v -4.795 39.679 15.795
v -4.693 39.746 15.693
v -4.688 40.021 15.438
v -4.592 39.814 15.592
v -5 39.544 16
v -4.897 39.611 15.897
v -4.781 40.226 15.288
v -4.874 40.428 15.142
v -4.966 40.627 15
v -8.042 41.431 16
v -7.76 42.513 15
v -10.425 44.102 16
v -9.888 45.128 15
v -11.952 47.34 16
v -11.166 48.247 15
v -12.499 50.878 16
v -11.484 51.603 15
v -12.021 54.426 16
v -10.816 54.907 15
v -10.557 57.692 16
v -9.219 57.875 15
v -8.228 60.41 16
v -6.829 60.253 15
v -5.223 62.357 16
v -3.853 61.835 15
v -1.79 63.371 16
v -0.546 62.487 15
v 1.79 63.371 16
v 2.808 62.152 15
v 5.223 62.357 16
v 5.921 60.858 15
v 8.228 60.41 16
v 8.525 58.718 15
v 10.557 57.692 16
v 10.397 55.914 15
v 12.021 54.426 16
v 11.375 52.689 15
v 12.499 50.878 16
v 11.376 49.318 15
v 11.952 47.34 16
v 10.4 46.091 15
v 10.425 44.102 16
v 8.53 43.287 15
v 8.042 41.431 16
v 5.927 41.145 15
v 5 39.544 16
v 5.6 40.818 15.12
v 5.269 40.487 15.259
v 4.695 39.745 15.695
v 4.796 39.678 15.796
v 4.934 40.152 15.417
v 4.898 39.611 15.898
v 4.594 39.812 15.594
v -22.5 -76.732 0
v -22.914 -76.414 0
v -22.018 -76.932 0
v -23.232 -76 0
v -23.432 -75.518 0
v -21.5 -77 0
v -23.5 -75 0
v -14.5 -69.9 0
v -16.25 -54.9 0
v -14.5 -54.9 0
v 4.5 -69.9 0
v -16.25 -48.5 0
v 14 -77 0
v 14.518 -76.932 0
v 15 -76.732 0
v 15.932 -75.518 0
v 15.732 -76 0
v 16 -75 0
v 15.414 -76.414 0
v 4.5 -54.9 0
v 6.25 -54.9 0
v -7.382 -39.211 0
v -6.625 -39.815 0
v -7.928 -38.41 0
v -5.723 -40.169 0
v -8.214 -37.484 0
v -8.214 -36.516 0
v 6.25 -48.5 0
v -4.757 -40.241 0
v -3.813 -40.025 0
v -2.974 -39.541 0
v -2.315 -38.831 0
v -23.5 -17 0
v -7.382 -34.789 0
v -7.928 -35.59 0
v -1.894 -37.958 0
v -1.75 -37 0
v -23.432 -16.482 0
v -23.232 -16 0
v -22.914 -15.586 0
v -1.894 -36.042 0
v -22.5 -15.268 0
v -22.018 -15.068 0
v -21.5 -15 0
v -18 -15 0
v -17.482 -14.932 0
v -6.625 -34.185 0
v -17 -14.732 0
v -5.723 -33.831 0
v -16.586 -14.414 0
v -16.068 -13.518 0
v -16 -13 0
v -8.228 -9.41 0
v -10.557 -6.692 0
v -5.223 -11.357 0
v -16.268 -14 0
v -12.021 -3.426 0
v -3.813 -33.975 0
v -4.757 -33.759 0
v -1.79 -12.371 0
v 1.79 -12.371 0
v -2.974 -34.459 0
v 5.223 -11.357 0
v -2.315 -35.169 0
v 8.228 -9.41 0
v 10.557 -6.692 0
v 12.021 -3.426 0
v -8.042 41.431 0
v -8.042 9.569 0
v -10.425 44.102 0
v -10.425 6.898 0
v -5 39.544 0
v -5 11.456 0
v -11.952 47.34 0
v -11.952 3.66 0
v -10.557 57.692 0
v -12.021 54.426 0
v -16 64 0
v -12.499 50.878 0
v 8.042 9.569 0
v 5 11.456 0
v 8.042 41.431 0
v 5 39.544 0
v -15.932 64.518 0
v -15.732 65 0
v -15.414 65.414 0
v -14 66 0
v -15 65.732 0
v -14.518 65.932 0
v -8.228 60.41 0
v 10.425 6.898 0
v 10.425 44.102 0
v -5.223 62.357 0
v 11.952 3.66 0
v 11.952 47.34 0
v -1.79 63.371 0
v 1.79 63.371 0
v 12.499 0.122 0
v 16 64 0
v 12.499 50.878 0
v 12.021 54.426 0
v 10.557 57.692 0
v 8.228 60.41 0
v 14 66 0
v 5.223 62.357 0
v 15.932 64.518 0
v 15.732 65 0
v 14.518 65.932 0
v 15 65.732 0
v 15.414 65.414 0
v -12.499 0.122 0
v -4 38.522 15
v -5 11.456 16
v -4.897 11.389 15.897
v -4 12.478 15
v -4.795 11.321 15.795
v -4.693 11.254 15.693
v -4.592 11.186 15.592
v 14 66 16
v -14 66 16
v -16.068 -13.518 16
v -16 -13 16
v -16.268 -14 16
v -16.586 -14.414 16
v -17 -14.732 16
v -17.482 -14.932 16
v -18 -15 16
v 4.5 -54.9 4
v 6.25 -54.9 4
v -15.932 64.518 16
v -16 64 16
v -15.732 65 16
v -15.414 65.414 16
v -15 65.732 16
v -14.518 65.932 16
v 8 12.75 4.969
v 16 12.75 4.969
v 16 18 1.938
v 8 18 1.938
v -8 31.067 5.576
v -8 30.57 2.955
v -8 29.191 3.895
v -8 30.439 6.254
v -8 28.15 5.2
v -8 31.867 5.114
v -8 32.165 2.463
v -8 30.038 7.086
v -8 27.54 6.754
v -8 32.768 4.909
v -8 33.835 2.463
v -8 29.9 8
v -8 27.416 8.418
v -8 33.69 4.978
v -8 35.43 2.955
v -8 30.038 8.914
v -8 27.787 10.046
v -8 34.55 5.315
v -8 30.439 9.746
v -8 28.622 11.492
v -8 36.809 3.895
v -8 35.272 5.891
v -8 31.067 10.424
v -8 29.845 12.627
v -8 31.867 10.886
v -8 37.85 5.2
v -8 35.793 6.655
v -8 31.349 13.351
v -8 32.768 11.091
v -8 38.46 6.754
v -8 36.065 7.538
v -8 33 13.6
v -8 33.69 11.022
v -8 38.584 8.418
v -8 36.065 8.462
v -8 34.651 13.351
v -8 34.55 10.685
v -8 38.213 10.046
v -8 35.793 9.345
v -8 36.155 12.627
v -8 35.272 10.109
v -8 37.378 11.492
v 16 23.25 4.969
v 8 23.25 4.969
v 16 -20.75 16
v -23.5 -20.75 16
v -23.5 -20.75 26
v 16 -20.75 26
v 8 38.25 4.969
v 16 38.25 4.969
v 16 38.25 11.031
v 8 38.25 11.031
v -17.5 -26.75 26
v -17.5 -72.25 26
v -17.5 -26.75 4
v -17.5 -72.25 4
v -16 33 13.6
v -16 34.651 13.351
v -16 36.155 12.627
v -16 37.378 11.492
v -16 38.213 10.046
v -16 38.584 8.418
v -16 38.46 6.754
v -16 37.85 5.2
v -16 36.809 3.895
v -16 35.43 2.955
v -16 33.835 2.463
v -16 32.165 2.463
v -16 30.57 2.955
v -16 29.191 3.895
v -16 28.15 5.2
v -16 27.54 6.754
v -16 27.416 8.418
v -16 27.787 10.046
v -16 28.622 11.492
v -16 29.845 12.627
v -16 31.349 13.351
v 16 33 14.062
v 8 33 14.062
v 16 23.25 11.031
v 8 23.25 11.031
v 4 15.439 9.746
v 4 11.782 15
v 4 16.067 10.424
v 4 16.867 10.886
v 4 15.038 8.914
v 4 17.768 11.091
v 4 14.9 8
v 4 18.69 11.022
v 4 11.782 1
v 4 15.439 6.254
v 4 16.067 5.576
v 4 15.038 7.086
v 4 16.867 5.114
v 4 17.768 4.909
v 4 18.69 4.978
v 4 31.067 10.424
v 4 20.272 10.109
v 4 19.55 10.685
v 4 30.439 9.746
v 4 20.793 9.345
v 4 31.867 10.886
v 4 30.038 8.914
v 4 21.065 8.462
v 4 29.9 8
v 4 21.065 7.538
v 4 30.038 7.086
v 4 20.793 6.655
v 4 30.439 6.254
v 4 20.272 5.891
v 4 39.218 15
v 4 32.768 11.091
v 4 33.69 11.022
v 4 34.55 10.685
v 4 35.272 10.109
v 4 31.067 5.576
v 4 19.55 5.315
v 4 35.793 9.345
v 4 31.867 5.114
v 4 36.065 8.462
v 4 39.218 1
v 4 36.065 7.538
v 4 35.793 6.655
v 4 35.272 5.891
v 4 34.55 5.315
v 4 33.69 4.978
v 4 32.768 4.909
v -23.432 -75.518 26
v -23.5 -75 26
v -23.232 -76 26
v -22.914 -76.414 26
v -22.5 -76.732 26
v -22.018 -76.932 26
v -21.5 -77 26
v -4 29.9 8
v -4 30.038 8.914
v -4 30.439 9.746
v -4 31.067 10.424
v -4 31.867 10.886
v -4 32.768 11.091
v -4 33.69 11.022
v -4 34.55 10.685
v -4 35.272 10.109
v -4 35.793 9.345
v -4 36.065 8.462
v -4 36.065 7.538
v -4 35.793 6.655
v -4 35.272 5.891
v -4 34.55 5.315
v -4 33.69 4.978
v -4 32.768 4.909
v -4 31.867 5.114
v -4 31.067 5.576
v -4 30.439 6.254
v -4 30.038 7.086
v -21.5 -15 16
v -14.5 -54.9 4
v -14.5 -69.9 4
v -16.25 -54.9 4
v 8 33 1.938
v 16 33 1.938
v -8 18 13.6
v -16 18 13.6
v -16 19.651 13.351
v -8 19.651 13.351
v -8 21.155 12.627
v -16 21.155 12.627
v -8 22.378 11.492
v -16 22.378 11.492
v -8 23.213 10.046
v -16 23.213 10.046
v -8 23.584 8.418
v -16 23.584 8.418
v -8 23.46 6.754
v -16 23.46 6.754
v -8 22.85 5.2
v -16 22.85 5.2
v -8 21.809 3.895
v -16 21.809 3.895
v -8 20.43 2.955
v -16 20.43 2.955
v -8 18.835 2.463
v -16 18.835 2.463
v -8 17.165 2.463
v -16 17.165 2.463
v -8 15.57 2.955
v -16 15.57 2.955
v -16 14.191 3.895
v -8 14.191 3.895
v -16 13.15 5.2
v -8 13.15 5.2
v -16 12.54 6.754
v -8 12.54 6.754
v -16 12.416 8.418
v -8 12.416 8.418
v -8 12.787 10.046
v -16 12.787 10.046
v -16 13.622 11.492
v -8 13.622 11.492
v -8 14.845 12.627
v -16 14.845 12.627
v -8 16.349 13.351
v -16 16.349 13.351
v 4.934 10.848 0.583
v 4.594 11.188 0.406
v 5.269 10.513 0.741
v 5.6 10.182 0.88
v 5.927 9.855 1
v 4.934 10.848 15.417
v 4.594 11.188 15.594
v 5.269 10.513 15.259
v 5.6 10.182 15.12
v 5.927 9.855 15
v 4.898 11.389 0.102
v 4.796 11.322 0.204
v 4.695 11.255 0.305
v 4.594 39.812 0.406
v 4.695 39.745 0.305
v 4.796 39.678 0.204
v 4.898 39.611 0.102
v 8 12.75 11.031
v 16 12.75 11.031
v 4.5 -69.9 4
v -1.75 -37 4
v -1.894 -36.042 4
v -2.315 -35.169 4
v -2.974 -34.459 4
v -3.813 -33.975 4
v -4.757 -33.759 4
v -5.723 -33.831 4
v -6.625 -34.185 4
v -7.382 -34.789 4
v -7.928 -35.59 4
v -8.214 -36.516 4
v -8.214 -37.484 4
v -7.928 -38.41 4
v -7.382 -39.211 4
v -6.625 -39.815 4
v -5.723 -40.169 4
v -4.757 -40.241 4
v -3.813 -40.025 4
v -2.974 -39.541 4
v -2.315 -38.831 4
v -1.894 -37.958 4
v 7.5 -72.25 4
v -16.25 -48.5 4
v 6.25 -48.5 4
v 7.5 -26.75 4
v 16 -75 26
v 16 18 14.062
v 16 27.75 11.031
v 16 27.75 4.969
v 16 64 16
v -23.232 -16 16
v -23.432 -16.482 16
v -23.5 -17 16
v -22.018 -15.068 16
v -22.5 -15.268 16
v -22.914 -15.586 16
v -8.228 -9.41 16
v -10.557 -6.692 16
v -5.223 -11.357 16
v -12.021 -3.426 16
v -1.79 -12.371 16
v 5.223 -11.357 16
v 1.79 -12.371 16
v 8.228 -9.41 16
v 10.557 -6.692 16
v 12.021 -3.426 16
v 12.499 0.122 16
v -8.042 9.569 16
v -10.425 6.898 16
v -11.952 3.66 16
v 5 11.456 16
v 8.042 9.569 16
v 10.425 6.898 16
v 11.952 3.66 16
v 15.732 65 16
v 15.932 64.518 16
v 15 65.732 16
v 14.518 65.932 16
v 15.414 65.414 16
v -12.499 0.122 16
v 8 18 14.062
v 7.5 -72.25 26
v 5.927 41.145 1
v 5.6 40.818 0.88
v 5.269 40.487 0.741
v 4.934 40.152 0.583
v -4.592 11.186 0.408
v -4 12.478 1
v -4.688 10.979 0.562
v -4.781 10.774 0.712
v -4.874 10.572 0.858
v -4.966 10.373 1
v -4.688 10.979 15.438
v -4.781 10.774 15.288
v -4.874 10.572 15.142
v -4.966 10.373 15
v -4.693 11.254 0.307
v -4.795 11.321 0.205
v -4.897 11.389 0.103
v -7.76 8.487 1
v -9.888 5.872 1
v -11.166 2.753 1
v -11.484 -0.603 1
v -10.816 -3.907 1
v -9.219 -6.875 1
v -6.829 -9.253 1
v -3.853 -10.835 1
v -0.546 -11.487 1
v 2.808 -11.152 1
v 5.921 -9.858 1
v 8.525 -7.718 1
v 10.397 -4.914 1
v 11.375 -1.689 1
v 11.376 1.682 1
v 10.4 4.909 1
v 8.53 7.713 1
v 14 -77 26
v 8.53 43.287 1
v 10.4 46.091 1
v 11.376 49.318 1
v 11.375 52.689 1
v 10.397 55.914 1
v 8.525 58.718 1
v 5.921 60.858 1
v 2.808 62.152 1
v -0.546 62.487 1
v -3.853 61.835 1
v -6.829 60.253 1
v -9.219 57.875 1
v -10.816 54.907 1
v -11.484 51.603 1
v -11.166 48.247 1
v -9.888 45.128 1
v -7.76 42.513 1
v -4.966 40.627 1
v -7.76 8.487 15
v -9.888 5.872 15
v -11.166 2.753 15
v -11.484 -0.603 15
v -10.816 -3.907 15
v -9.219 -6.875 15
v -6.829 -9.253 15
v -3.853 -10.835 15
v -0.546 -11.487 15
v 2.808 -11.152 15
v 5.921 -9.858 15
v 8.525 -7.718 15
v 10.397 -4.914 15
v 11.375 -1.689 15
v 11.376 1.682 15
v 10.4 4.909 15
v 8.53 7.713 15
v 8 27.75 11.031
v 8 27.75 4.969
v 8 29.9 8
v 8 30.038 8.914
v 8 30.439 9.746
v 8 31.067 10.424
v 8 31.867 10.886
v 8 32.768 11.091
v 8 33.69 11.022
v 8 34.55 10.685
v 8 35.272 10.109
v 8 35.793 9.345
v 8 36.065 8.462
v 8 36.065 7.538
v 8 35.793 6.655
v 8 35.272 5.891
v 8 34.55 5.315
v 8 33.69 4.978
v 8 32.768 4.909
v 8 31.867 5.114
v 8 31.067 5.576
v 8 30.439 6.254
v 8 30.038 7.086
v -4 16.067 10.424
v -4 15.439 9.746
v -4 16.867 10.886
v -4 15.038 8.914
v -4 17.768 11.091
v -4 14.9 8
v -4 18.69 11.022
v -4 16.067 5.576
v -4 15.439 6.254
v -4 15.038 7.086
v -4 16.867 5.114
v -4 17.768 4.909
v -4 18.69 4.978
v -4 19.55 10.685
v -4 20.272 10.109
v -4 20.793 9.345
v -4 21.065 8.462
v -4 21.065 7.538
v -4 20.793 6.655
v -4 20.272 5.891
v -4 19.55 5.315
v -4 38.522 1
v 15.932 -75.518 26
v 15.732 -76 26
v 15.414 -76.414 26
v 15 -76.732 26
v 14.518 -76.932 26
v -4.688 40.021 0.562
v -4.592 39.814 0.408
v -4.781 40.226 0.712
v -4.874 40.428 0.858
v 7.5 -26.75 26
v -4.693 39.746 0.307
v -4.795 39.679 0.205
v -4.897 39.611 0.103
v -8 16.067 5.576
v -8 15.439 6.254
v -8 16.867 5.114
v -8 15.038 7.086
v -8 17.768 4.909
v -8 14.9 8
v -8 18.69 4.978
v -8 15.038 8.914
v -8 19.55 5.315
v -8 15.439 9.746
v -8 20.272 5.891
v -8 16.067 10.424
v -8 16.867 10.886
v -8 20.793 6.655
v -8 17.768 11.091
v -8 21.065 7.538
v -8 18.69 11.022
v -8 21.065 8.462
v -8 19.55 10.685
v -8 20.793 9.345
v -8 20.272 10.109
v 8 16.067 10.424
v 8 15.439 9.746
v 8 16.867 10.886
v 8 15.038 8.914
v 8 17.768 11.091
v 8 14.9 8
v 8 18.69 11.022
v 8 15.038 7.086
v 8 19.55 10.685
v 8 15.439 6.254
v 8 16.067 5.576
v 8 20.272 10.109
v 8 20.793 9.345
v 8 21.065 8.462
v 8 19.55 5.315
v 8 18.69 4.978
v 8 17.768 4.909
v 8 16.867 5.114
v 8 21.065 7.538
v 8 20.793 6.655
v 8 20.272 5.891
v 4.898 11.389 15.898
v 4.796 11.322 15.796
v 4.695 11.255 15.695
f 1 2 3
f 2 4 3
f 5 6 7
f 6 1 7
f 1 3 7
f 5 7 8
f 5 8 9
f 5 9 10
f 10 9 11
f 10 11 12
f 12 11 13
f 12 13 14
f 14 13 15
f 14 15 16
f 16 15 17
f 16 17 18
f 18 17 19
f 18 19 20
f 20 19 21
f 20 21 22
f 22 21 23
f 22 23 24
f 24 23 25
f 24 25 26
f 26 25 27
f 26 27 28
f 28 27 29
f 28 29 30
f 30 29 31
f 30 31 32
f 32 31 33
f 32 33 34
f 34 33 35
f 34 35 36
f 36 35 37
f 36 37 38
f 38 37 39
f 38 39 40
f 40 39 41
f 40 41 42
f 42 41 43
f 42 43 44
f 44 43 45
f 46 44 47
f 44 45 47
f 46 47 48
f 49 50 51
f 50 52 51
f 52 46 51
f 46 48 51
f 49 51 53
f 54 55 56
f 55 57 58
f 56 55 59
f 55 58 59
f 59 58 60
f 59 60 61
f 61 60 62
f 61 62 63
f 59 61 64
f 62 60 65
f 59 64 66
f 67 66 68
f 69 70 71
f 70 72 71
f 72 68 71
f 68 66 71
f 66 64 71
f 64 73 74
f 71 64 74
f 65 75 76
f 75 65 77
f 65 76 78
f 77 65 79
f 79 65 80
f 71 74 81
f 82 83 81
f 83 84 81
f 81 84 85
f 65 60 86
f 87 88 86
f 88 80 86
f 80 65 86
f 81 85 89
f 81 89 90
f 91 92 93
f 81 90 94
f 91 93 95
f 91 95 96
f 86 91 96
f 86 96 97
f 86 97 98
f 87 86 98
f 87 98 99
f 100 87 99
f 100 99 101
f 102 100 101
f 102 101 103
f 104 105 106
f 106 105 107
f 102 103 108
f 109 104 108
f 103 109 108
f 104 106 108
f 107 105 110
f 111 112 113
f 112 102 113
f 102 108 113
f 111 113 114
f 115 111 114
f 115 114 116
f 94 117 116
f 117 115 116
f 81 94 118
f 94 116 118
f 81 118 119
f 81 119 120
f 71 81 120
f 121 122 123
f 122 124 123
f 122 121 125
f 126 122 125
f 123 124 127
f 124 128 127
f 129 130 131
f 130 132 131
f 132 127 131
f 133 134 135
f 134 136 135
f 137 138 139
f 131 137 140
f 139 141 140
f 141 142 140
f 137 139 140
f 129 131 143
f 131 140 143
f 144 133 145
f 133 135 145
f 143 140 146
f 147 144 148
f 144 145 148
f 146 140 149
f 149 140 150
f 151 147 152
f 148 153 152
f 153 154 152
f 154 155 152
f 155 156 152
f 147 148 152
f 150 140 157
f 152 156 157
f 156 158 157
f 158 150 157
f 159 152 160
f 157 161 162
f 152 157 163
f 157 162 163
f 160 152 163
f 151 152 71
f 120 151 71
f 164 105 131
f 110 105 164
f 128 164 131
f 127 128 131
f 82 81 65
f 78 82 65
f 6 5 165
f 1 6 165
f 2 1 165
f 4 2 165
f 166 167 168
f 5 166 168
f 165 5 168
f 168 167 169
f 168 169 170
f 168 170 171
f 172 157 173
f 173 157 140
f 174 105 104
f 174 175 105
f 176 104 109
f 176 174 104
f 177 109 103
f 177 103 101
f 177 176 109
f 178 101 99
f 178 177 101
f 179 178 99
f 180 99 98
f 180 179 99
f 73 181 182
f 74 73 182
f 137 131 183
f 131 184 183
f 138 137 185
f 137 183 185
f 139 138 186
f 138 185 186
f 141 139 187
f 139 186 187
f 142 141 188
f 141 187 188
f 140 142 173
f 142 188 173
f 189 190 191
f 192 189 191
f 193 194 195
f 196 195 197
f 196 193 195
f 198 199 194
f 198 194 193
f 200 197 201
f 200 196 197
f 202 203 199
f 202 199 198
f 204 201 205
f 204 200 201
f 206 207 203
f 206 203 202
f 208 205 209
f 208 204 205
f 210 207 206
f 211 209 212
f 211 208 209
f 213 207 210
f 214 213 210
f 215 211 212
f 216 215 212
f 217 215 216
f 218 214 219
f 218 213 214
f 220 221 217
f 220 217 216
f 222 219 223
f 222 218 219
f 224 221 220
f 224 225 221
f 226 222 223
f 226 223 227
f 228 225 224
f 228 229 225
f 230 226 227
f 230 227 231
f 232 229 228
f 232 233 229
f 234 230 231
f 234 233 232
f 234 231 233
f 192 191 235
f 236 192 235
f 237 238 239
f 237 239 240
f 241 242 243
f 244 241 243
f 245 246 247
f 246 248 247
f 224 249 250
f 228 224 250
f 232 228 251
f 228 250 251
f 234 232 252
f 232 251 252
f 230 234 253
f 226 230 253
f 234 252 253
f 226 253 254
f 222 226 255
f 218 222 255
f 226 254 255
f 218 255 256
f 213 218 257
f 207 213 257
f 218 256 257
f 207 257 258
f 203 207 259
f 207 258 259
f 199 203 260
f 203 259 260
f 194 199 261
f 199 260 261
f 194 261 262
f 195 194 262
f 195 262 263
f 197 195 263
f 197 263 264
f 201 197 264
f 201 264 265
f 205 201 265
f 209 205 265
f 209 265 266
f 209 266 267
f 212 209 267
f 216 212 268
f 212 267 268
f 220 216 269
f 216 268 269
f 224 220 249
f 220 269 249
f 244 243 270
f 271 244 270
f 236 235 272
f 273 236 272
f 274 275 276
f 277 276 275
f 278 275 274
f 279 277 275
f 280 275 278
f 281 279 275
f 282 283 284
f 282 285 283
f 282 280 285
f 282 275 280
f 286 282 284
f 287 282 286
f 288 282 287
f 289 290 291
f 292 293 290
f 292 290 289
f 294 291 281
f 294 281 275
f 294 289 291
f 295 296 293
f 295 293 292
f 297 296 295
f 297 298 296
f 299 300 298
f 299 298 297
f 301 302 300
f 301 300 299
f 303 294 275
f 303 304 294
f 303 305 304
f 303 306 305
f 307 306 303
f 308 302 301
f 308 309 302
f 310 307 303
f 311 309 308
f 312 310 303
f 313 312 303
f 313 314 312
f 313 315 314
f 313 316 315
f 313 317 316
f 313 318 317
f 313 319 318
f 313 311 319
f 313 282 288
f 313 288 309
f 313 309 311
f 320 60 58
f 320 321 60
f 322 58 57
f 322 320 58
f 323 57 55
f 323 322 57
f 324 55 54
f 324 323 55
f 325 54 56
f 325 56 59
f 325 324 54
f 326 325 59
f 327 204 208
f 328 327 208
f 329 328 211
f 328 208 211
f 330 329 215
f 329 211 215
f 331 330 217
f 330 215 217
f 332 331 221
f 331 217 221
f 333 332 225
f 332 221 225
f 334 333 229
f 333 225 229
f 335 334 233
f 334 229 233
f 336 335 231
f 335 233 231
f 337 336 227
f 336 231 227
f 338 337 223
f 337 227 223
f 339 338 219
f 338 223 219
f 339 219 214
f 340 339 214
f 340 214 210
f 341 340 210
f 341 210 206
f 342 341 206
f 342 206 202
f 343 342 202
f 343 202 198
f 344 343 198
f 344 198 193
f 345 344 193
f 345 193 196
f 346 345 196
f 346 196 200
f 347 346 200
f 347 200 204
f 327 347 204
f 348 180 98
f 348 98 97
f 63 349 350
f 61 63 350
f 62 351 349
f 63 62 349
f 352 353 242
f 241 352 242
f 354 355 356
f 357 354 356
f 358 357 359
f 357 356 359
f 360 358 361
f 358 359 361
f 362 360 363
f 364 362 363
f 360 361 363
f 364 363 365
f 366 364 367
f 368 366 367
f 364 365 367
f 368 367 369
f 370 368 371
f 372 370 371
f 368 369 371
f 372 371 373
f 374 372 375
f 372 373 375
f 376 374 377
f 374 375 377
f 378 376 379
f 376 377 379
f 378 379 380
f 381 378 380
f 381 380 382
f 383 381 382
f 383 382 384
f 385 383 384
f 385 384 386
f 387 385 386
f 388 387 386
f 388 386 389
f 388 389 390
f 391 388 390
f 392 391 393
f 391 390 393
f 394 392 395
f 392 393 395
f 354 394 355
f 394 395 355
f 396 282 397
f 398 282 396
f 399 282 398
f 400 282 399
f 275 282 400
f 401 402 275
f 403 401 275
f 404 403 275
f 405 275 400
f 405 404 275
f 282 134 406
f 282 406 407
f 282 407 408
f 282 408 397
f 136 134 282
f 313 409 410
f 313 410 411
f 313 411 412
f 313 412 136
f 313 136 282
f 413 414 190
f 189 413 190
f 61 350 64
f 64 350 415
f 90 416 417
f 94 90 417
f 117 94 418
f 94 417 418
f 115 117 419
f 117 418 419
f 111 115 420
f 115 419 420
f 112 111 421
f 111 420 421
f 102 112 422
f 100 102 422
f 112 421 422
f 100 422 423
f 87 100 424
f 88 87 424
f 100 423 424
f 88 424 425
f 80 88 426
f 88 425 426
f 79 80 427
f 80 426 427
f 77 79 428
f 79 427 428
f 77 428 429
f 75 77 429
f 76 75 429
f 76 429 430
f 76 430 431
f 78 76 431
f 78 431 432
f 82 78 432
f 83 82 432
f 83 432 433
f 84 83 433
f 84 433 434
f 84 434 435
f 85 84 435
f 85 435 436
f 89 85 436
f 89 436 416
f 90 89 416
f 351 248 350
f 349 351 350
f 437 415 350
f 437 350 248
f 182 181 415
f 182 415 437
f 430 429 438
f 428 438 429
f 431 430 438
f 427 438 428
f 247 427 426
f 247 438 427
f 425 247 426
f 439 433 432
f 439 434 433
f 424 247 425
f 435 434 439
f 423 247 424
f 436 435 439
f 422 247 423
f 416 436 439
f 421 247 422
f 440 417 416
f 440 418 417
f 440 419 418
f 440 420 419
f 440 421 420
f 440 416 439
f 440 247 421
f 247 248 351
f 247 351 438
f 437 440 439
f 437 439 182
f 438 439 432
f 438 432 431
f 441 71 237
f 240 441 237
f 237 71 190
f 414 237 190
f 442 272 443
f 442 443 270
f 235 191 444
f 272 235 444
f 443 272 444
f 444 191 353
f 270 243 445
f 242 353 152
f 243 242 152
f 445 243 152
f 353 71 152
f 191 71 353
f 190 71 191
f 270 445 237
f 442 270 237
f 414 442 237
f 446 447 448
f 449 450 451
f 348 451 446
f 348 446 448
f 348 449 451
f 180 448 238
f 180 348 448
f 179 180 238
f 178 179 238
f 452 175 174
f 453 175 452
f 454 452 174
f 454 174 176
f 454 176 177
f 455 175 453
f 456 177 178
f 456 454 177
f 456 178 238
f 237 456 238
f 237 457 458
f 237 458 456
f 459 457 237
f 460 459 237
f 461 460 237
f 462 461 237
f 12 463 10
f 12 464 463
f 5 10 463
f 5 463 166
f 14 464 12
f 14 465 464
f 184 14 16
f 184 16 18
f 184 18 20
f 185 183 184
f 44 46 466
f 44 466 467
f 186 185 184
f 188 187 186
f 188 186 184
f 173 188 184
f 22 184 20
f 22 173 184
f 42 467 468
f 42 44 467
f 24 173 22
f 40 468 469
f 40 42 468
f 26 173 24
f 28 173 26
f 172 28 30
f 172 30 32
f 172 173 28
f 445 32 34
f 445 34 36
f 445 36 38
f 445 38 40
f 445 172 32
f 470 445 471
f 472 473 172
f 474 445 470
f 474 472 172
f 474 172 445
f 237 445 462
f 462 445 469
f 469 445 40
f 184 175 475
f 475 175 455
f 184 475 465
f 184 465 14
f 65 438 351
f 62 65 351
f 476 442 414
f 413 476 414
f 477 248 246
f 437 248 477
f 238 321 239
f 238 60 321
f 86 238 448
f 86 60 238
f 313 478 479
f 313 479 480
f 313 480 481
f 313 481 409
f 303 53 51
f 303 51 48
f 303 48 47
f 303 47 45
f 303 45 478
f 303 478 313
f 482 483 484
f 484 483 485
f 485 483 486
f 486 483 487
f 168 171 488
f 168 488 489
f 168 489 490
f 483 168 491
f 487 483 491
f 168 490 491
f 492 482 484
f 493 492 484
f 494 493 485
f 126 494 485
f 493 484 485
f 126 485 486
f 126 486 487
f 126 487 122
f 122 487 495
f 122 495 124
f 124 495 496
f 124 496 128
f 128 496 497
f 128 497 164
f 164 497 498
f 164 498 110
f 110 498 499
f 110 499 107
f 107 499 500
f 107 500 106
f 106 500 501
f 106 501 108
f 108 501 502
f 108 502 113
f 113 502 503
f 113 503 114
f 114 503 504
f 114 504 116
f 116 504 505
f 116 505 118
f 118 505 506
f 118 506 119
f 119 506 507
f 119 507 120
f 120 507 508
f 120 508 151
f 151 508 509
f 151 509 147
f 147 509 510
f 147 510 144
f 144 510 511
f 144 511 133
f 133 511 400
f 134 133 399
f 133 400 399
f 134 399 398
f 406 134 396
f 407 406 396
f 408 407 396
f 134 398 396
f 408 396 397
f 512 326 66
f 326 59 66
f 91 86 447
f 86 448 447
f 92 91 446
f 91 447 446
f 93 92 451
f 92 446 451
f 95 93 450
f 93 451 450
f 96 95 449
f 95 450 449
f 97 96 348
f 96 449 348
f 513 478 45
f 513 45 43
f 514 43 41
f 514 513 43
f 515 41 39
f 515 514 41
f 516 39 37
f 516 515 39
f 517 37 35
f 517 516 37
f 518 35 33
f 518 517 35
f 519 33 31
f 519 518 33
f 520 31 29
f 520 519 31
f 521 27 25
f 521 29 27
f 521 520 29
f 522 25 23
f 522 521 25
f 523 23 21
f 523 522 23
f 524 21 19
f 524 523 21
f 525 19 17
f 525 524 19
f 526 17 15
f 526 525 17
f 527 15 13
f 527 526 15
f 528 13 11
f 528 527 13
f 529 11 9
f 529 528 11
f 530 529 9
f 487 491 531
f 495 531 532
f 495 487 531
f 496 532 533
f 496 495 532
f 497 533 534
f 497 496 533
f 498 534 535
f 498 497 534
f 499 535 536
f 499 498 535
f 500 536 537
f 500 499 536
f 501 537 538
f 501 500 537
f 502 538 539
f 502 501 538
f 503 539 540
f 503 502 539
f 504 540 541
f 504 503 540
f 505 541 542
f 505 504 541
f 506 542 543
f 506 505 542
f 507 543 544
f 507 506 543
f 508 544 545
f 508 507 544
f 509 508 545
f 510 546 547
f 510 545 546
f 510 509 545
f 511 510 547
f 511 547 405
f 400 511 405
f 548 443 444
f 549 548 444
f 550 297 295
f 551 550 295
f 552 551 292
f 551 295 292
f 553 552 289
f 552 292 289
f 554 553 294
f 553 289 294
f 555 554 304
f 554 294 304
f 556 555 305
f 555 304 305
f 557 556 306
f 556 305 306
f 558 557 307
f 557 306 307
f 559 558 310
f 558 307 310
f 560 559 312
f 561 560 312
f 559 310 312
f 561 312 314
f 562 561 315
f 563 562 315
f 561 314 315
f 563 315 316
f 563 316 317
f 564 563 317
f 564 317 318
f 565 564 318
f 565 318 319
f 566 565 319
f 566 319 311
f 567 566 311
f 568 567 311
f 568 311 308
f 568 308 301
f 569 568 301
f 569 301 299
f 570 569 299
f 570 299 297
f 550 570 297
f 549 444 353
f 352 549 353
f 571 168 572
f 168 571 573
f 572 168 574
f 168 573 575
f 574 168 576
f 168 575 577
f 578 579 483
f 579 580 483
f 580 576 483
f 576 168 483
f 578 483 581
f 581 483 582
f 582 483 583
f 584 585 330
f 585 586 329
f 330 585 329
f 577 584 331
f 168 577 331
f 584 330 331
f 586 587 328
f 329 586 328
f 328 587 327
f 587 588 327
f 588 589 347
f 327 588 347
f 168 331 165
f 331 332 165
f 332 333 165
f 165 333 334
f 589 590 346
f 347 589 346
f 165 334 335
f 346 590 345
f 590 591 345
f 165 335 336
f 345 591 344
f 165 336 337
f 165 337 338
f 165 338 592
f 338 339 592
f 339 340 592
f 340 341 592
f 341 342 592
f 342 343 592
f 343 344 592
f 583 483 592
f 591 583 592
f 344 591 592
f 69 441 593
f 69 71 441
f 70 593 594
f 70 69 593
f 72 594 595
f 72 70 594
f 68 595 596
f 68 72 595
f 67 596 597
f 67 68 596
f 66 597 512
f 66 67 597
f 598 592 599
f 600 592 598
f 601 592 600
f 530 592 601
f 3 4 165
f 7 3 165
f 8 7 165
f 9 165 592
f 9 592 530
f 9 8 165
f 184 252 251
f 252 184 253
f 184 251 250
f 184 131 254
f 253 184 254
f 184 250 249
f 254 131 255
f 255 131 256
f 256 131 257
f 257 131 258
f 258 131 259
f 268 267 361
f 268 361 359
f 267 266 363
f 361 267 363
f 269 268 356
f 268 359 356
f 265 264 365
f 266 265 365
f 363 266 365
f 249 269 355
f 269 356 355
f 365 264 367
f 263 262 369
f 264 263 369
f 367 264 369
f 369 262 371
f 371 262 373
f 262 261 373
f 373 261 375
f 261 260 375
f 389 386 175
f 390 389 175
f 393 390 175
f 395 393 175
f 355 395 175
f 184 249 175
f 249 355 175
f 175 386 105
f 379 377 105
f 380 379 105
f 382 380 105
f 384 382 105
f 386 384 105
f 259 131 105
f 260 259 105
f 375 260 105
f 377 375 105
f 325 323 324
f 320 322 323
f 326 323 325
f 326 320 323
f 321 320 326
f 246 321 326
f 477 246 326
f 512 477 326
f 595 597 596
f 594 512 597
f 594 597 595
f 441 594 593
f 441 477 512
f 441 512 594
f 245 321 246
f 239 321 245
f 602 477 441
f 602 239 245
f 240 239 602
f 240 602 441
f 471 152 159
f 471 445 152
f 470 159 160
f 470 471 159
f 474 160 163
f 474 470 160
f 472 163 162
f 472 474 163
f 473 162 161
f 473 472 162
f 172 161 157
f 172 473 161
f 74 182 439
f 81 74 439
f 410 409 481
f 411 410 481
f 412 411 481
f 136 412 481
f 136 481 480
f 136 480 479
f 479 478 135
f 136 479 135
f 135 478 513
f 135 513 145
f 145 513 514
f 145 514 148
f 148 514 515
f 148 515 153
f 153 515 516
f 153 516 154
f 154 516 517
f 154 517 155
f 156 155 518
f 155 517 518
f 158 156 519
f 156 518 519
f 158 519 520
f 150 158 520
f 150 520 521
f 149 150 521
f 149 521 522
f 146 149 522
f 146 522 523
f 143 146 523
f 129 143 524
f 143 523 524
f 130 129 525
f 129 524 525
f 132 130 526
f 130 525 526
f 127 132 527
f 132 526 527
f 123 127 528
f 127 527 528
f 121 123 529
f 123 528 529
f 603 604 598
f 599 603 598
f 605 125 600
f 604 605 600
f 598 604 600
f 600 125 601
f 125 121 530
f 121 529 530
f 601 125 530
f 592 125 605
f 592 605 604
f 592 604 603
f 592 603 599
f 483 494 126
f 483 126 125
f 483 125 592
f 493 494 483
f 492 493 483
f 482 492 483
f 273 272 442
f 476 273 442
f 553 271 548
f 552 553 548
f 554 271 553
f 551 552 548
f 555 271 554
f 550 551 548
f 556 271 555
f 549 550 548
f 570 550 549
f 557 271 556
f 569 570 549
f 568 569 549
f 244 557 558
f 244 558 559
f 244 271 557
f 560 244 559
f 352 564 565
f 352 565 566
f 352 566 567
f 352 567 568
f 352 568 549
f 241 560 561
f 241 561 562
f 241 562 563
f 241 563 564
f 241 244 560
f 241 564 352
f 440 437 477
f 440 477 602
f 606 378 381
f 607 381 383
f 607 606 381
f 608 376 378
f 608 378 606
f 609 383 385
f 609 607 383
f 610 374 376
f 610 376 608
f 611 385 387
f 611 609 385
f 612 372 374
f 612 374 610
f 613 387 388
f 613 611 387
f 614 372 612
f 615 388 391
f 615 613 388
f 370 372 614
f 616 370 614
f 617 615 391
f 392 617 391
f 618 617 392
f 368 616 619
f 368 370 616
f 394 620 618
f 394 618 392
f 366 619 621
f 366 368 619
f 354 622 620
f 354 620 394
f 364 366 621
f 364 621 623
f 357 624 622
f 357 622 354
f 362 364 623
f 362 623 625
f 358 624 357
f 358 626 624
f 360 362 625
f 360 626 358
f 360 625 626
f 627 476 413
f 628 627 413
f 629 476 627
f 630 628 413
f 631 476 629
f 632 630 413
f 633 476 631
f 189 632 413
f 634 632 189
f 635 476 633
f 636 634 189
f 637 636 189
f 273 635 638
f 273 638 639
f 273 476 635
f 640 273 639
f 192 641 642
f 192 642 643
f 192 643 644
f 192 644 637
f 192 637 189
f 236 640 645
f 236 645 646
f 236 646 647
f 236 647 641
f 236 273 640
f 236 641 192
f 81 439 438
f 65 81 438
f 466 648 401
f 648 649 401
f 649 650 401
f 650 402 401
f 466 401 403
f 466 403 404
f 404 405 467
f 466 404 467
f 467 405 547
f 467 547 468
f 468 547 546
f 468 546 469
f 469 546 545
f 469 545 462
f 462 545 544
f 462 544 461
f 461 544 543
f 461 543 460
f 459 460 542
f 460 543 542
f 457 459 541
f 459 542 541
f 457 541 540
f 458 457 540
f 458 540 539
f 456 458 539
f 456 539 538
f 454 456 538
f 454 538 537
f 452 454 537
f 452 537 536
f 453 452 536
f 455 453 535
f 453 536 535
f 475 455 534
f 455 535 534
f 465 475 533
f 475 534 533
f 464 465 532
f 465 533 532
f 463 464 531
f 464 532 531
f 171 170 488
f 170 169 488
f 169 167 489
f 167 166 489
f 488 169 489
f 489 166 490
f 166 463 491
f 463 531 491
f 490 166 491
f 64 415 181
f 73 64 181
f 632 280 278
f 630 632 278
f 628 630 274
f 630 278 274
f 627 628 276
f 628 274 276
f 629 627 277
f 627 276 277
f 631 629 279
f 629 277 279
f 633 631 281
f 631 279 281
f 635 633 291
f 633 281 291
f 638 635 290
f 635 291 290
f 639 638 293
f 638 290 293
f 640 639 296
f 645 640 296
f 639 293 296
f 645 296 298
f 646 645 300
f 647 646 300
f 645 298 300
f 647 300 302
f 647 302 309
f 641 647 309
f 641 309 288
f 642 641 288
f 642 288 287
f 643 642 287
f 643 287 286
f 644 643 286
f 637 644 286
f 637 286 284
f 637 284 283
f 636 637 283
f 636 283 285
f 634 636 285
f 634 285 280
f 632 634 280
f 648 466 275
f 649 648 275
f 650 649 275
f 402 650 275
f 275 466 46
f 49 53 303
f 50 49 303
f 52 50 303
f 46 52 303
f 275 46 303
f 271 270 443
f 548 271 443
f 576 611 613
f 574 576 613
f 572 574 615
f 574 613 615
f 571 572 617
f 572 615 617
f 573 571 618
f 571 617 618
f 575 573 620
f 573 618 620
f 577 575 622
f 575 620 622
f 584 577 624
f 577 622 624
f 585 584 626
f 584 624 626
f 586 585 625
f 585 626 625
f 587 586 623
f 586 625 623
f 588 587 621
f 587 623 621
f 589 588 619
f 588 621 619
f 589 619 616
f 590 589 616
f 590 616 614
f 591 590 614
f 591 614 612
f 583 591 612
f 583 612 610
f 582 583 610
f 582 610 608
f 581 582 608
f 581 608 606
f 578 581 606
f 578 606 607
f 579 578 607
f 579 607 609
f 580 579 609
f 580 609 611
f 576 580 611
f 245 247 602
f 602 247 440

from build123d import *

# Parameters (mm, degrees)
SKETCH_1_R               = 11.5
SKETCH_1_W               = 25
SKETCH_1_H               = 45.5
EXTRUDE_1_DEPTH          = 16
SKETCH_2_R               = 3.1
CUT_EXTRUDE_1_DEPTH      = 120.143820654
SKETCH_2_2_R             = 5.6
SKETCH_2_2_R_2           = 3.1
CUT_EXTRUDE_1_2_DEPTH    = 8
CUT_EXTRUDE_2_DEPTH      = 108.64408948
CUT_EXTRUDE_2_DEPTH_BACK = 108.64408948
SKETCH_3_W               = 8
SKETCH_3_H               = 51
CUT_EXTRUDE_2_2_DEPTH    = 8
CHAMFER_1_SIZE           = 1.695682666
CHAMFER_1_SIZE_2         = 1
SKETCH_1_2_W             = 25
SKETCH_1_2_H             = 45.5
EXTRUDE_2_DEPTH          = 4
SKETCH_6_R               = 3.25
CUT_EXTRUDE_3_DEPTH      = 108.122593322
SKETCH_7_W               = 39.5
SKETCH_7_H               = 56.25
SKETCH_7_W_2             = 25
SKETCH_7_H_2             = 45.5
SKETCH_7_W_3             = 37
EXTRUDE_3_DEPTH          = 10
FILLET_1_R               = 2
CHAMFER_2_SIZE           = 1
CHAMFER_3_SIZE           = 25
CUT_EXTRUDE_4_DEPTH      = 108.64408948
CUT_EXTRUDE_4_DEPTH_BACK = 108.64408948
SKETCH_8_W               = 71.361850602
SKETCH_8_H               = 94.902741324
FILLET_2_R               = 2


with BuildPart() as part:
    # 草图1 → 凸台-拉伸1 (new body)
    with BuildSketch(Plane.XY):
        Polygon((16, 66), (-16, 66), (-16, -15), (-23.5, -15), (-23.5, -77), (13.5, -77), (73.5, -77), (73.5, -15), (16, -15), align=None)
        with Locations((0, 51)):
            Circle(SKETCH_1_R, mode=Mode.SUBTRACT)
        Circle(SKETCH_1_R, mode=Mode.SUBTRACT)
        with Locations((-5, -49.5)):
            Rectangle(SKETCH_1_W, SKETCH_1_H, mode=Mode.SUBTRACT)
        with Locations((55, -49.5)):
            Rectangle(SKETCH_1_W, SKETCH_1_H, mode=Mode.SUBTRACT)
    extrude(amount=EXTRUDE_1_DEPTH)

    # 草图2 → Cut-Extrude 1 (cut, through all)
    with BuildSketch(Plane.ZY.offset(16)):
        with Locations(Location((8, 33, 0), (0, 0, 270))):
            Circle(SKETCH_2_R)
        with Locations(Location((8, 18, 0), (0, 0, 270))):
            Circle(SKETCH_2_R)
    extrude(amount=-CUT_EXTRUDE_1_DEPTH, mode=Mode.SUBTRACT)

    # 草图2<2> → Cut-Extrude 1 2 (cut)
    # profile 1 of 2: a face of its own
    with BuildSketch(Plane.ZY.offset(16)):
        with Locations((8, 33)):
            Circle(SKETCH_2_2_R)
        with Locations((8, 33)):
            Circle(SKETCH_2_2_R_2, mode=Mode.SUBTRACT)
    # profile 2 of 2: a face of its own
    with BuildSketch(Plane.ZY.offset(16)):
        with Locations((8, 18)):
            Circle(SKETCH_2_2_R)
        with Locations((8, 18)):
            Circle(SKETCH_2_2_R_2, mode=Mode.SUBTRACT)
    extrude(amount=-CUT_EXTRUDE_1_2_DEPTH, mode=Mode.SUBTRACT)

    # 草图3 → Cut-Extrude 2 (cut, two sides: drawn at the far end of the back side and taken through both)
    with BuildSketch(Plane.XY.offset(16).offset(-CUT_EXTRUDE_2_DEPTH_BACK)):
        with Locations((0, 25.5)):
            Rectangle(SKETCH_3_W, SKETCH_3_H)
    extrude(amount=CUT_EXTRUDE_2_DEPTH + CUT_EXTRUDE_2_DEPTH_BACK, mode=Mode.SUBTRACT)

    # 草图4 → Cut-Extrude 2 2 (cut)
    with BuildSketch(Plane(origin=(16, 0, 0), x_dir=(0, 0, -1), z_dir=(1, 0, 0))):
        Polygon((-1.937822174, 33), (-4.968911087, 38.25), (-11.031088913, 38.25), (-14.062177826, 33), (-11.031088913, 27.75), (-4.968911087, 27.75), align=None)
        Polygon((-1.937822174, 18), (-4.968911087, 23.25), (-11.031088913, 23.25), (-14.062177826, 18), (-11.031088913, 12.75), (-4.968911087, 12.75), align=None)
    extrude(amount=-CUT_EXTRUDE_2_2_DEPTH, mode=Mode.SUBTRACT)

    # 倒角1
    # the kernel refuses this chamfer: 1.695682666, 1 mm, written as the material it takes off along each edge
    with BuildSketch(Plane(origin=(-4, 40.218070674, 20.393897044), x_dir=(0, -1, 0), z_dir=(0, 0, -1))) as chamfer_1_piece_1:
        with BuildLine():
            Line((CHAMFER_1_SIZE, 0), (-0.409315042, 0.965770122))
            ThreePointArc((-0.409315042, 0.965770122), (-0.203470382, 0.51067693), (0, 0))
            Line((0, 0), (CHAMFER_1_SIZE, 0))
        make_face()
    extrude(amount=24.787794087, mode=Mode.SUBTRACT)
    with BuildSketch(Plane(origin=(-4, 10.781929326, 20.393897044), x_dir=(0, 1, 0), z_dir=(0, 0, -1))) as chamfer_1_piece_2:
        with BuildLine():
            Line((CHAMFER_1_SIZE, 0), (-0.409315042, -0.965770122))
            ThreePointArc((-0.409315042, -0.965770122), (-0.203470382, -0.51067693), (0, 0))
            Line((0, 0), (CHAMFER_1_SIZE, 0))
        make_face()
    extrude(amount=24.787794087, mode=Mode.SUBTRACT)
    with BuildSketch(Plane(origin=(4, 40.218070674, 21.505815426), x_dir=(0.9011630930702207, 0.4334801952663038, 0), z_dir=(0, 0, -1))) as chamfer_1_piece_3:
        with BuildLine():
            Line((2.138200915, 0), (-CHAMFER_1_SIZE_2 * 0.433480195266, CHAMFER_1_SIZE_2 * 0.90116309307))
            Line((-CHAMFER_1_SIZE_2 * 0.433480195266, CHAMFER_1_SIZE_2 * 0.90116309307), (0, 0))
            ThreePointArc((0, 0), (1.101276568, 0.049757425), (2.138200915, 0))
        make_face()
    extrude(amount=27.011630851, mode=Mode.SUBTRACT)
    with BuildSketch(Plane(origin=(4, 10.781929326, 21.505815426), x_dir=(0, 1, 0), z_dir=(0, 0, -1))) as chamfer_1_piece_4:
        with BuildLine():
            Line((CHAMFER_1_SIZE_2, 0), (-0.92686775, 1.92686775))
            ThreePointArc((-0.92686775, 1.92686775), (-0.432542027, 1.013998656), (0, 0))
            Line((0, 0), (CHAMFER_1_SIZE_2, 0))
        make_face()
    extrude(amount=27.011630851, mode=Mode.SUBTRACT)

    # 草图1<2> → 凸台-拉伸2 (add)
    with BuildSketch(Plane.XY):
        with Locations((-5, -49.5)):
            Rectangle(SKETCH_1_2_W, SKETCH_1_2_H)
        with Locations((55, -49.5)):
            Rectangle(SKETCH_1_2_W, SKETCH_1_2_H)
    extrude(amount=EXTRUDE_2_DEPTH)

    # 草图6 → 切除-拉伸3 (cut, through all)
    with BuildSketch(Plane.XY.offset(4)):
        with Locations((-5, -37)):
            Circle(SKETCH_6_R)
        with Locations((55, -37)):
            Circle(SKETCH_6_R)
        Polygon((-16.25, -54.9), (-14.5, -54.9), (-14.5, -69.9), (4.5, -69.9), (4.5, -54.9), (6.25, -54.9), (6.25, -48.5), (-16.25, -48.5), align=None)
        Polygon((45.5, -54.9), (43.75, -54.9), (43.75, -48.5), (66.25, -48.5), (66.25, -54.9), (64.5, -54.9), (64.5, -69.9), (45.5, -69.9), align=None)
    extrude(amount=-CUT_EXTRUDE_3_DEPTH, mode=Mode.SUBTRACT)

    # 草图7 → 凸台-拉伸3 (add)
    # profile 1 of 2: a face of its own
    with BuildSketch(Plane.XY.offset(16)):
        with Locations((-3.75, -48.875)):
            Rectangle(SKETCH_7_W, SKETCH_7_H)
        with Locations((-5, -49.5)):
            Rectangle(SKETCH_7_W_2, SKETCH_7_H_2, mode=Mode.SUBTRACT)
    # profile 2 of 2: a face of its own
    with BuildSketch(Plane.XY.offset(16)):
        with Locations((55, -48.875)):
            Rectangle(SKETCH_7_W_3, SKETCH_7_H)
        with Locations((55, -49.5)):
            Rectangle(SKETCH_7_W_2, SKETCH_7_H_2, mode=Mode.SUBTRACT)
    extrude(amount=EXTRUDE_3_DEPTH)

    # 圆角1
    fillet_1_edges = [part.edges().sort_by_distance(p)[0] for p in [
        (-16, 66, 8),
        (16, 66, 8),
        (73.5, -15, 8),
        (73.5, -77, 13),
        (-23.5, -77, 13),
        (-23.5, -15, 8),
        (-16, -15, 8),
    ]]
    fillet(fillet_1_edges, radius=FILLET_1_R)

    # 倒角2
    # the kernel refuses this chamfer: 1 mm, written as the material it takes off along each edge
    with BuildSketch(Plane(origin=(-4, 9.905929004, 16), x_dir=(-1, 0, 0), z_dir=(0, 1, 0))) as chamfer_2_piece_1:
        Polygon((CHAMFER_2_SIZE, 0), (0, -CHAMFER_2_SIZE), (0, 0), align=None)
    extrude(amount=31.188141991, mode=Mode.SUBTRACT)
    with BuildSketch(Plane(origin=(-4, 9.905929004, 0), x_dir=(-1, 0, 0), z_dir=(0, 1, 0))) as chamfer_2_piece_2:
        Polygon((CHAMFER_2_SIZE, 0), (0, CHAMFER_2_SIZE), (0, 0), align=None)
    extrude(amount=31.188141991, mode=Mode.SUBTRACT)
    with BuildSketch(Plane(origin=(0, 0, 16), x_dir=(0.15887239859298968, 0.9872991243616649, 0), z_dir=(-0.9872991243616649, 0.15887239859298968, 0))) as chamfer_2_piece_3:
        Polygon((11.5 + CHAMFER_2_SIZE, 0), (11.5, CHAMFER_2_SIZE), (11.5, 0), align=None)
    revolve(axis=Axis((0, 0, 16), (0, 0, -1)), revolution_arc=338.147720881, mode=Mode.SUBTRACT)
    with BuildSketch(Plane(origin=(0, 0, 0), x_dir=(-0.22003054145636358, 0.9754929834839509, 0), z_dir=(0.9754929834839509, 0.22003054145636358, 0))) as chamfer_2_piece_4:
        Polygon((11.5 + CHAMFER_2_SIZE, 0), (11.5, CHAMFER_2_SIZE), (11.5, 0), align=None)
    revolve(axis=Axis((0, 0, 0), (0, 0, 1)), revolution_arc=338.147720881, mode=Mode.SUBTRACT)
    with BuildSketch(Plane(origin=(4, 41.789753662, 16), x_dir=(1, 0, 0), z_dir=(0, -1, 0))) as chamfer_2_piece_5:
        Polygon((CHAMFER_2_SIZE, 0), (0, -CHAMFER_2_SIZE), (0, 0), align=None)
    extrude(amount=32.579507323, mode=Mode.SUBTRACT)
    with BuildSketch(Plane(origin=(4, 41.789753662, 0), x_dir=(1, 0, 0), z_dir=(0, -1, 0))) as chamfer_2_piece_6:
        Polygon((CHAMFER_2_SIZE, 0), (0, CHAMFER_2_SIZE), (0, 0), align=None)
    extrude(amount=32.579507323, mode=Mode.SUBTRACT)
    with BuildSketch(Plane(origin=(0, 51, 0), x_dir=(0.15887239859295355, -0.9872991243616707, 0), z_dir=(-0.9872991243616707, -0.15887239859295355, 0))) as chamfer_2_piece_7:
        Polygon((11.5 + CHAMFER_2_SIZE, 0), (11.5, CHAMFER_2_SIZE), (11.5, 0), align=None)
    revolve(axis=Axis((0, 51, 0), (0, 0, 1)), revolution_arc=338.147720881, mode=Mode.SUBTRACT)
    with BuildSketch(Plane(origin=(0, 51, 16), x_dir=(-0.2200305414563642, -0.9754929834839506, 0), z_dir=(0.9754929834839506, -0.2200305414563642, 0))) as chamfer_2_piece_8:
        Polygon((11.5 + CHAMFER_2_SIZE, 0), (11.5, CHAMFER_2_SIZE), (11.5, 0), align=None)
    revolve(axis=Axis((0, 51, 16), (0, 0, -1)), revolution_arc=338.147720881, mode=Mode.SUBTRACT)

    # 倒角3
    chamfer_3_edges = [part.edges().sort_by_distance(p)[0] for p in [
        (16, -15, 8),
    ]]
    chamfer(chamfer_3_edges, length=CHAMFER_3_SIZE)

    # 草图8 → 切除-拉伸4 (cut, two sides: drawn at the far end of the back side and taken through both)
    with BuildSketch(Plane.XY.offset(16).offset(-CUT_EXTRUDE_4_DEPTH_BACK)):
        with Locations((51.680925301, -37.451370662)):
            Rectangle(SKETCH_8_W, SKETCH_8_H)
    extrude(amount=CUT_EXTRUDE_4_DEPTH + CUT_EXTRUDE_4_DEPTH_BACK, mode=Mode.SUBTRACT)

    # 圆角2
    fillet_2_edges = [part.edges().sort_by_distance(p)[0] for p in [
        (16, -77, 13),
    ]]
    fillet(fillet_2_edges, radius=FILLET_2_R)


solid = part.part
